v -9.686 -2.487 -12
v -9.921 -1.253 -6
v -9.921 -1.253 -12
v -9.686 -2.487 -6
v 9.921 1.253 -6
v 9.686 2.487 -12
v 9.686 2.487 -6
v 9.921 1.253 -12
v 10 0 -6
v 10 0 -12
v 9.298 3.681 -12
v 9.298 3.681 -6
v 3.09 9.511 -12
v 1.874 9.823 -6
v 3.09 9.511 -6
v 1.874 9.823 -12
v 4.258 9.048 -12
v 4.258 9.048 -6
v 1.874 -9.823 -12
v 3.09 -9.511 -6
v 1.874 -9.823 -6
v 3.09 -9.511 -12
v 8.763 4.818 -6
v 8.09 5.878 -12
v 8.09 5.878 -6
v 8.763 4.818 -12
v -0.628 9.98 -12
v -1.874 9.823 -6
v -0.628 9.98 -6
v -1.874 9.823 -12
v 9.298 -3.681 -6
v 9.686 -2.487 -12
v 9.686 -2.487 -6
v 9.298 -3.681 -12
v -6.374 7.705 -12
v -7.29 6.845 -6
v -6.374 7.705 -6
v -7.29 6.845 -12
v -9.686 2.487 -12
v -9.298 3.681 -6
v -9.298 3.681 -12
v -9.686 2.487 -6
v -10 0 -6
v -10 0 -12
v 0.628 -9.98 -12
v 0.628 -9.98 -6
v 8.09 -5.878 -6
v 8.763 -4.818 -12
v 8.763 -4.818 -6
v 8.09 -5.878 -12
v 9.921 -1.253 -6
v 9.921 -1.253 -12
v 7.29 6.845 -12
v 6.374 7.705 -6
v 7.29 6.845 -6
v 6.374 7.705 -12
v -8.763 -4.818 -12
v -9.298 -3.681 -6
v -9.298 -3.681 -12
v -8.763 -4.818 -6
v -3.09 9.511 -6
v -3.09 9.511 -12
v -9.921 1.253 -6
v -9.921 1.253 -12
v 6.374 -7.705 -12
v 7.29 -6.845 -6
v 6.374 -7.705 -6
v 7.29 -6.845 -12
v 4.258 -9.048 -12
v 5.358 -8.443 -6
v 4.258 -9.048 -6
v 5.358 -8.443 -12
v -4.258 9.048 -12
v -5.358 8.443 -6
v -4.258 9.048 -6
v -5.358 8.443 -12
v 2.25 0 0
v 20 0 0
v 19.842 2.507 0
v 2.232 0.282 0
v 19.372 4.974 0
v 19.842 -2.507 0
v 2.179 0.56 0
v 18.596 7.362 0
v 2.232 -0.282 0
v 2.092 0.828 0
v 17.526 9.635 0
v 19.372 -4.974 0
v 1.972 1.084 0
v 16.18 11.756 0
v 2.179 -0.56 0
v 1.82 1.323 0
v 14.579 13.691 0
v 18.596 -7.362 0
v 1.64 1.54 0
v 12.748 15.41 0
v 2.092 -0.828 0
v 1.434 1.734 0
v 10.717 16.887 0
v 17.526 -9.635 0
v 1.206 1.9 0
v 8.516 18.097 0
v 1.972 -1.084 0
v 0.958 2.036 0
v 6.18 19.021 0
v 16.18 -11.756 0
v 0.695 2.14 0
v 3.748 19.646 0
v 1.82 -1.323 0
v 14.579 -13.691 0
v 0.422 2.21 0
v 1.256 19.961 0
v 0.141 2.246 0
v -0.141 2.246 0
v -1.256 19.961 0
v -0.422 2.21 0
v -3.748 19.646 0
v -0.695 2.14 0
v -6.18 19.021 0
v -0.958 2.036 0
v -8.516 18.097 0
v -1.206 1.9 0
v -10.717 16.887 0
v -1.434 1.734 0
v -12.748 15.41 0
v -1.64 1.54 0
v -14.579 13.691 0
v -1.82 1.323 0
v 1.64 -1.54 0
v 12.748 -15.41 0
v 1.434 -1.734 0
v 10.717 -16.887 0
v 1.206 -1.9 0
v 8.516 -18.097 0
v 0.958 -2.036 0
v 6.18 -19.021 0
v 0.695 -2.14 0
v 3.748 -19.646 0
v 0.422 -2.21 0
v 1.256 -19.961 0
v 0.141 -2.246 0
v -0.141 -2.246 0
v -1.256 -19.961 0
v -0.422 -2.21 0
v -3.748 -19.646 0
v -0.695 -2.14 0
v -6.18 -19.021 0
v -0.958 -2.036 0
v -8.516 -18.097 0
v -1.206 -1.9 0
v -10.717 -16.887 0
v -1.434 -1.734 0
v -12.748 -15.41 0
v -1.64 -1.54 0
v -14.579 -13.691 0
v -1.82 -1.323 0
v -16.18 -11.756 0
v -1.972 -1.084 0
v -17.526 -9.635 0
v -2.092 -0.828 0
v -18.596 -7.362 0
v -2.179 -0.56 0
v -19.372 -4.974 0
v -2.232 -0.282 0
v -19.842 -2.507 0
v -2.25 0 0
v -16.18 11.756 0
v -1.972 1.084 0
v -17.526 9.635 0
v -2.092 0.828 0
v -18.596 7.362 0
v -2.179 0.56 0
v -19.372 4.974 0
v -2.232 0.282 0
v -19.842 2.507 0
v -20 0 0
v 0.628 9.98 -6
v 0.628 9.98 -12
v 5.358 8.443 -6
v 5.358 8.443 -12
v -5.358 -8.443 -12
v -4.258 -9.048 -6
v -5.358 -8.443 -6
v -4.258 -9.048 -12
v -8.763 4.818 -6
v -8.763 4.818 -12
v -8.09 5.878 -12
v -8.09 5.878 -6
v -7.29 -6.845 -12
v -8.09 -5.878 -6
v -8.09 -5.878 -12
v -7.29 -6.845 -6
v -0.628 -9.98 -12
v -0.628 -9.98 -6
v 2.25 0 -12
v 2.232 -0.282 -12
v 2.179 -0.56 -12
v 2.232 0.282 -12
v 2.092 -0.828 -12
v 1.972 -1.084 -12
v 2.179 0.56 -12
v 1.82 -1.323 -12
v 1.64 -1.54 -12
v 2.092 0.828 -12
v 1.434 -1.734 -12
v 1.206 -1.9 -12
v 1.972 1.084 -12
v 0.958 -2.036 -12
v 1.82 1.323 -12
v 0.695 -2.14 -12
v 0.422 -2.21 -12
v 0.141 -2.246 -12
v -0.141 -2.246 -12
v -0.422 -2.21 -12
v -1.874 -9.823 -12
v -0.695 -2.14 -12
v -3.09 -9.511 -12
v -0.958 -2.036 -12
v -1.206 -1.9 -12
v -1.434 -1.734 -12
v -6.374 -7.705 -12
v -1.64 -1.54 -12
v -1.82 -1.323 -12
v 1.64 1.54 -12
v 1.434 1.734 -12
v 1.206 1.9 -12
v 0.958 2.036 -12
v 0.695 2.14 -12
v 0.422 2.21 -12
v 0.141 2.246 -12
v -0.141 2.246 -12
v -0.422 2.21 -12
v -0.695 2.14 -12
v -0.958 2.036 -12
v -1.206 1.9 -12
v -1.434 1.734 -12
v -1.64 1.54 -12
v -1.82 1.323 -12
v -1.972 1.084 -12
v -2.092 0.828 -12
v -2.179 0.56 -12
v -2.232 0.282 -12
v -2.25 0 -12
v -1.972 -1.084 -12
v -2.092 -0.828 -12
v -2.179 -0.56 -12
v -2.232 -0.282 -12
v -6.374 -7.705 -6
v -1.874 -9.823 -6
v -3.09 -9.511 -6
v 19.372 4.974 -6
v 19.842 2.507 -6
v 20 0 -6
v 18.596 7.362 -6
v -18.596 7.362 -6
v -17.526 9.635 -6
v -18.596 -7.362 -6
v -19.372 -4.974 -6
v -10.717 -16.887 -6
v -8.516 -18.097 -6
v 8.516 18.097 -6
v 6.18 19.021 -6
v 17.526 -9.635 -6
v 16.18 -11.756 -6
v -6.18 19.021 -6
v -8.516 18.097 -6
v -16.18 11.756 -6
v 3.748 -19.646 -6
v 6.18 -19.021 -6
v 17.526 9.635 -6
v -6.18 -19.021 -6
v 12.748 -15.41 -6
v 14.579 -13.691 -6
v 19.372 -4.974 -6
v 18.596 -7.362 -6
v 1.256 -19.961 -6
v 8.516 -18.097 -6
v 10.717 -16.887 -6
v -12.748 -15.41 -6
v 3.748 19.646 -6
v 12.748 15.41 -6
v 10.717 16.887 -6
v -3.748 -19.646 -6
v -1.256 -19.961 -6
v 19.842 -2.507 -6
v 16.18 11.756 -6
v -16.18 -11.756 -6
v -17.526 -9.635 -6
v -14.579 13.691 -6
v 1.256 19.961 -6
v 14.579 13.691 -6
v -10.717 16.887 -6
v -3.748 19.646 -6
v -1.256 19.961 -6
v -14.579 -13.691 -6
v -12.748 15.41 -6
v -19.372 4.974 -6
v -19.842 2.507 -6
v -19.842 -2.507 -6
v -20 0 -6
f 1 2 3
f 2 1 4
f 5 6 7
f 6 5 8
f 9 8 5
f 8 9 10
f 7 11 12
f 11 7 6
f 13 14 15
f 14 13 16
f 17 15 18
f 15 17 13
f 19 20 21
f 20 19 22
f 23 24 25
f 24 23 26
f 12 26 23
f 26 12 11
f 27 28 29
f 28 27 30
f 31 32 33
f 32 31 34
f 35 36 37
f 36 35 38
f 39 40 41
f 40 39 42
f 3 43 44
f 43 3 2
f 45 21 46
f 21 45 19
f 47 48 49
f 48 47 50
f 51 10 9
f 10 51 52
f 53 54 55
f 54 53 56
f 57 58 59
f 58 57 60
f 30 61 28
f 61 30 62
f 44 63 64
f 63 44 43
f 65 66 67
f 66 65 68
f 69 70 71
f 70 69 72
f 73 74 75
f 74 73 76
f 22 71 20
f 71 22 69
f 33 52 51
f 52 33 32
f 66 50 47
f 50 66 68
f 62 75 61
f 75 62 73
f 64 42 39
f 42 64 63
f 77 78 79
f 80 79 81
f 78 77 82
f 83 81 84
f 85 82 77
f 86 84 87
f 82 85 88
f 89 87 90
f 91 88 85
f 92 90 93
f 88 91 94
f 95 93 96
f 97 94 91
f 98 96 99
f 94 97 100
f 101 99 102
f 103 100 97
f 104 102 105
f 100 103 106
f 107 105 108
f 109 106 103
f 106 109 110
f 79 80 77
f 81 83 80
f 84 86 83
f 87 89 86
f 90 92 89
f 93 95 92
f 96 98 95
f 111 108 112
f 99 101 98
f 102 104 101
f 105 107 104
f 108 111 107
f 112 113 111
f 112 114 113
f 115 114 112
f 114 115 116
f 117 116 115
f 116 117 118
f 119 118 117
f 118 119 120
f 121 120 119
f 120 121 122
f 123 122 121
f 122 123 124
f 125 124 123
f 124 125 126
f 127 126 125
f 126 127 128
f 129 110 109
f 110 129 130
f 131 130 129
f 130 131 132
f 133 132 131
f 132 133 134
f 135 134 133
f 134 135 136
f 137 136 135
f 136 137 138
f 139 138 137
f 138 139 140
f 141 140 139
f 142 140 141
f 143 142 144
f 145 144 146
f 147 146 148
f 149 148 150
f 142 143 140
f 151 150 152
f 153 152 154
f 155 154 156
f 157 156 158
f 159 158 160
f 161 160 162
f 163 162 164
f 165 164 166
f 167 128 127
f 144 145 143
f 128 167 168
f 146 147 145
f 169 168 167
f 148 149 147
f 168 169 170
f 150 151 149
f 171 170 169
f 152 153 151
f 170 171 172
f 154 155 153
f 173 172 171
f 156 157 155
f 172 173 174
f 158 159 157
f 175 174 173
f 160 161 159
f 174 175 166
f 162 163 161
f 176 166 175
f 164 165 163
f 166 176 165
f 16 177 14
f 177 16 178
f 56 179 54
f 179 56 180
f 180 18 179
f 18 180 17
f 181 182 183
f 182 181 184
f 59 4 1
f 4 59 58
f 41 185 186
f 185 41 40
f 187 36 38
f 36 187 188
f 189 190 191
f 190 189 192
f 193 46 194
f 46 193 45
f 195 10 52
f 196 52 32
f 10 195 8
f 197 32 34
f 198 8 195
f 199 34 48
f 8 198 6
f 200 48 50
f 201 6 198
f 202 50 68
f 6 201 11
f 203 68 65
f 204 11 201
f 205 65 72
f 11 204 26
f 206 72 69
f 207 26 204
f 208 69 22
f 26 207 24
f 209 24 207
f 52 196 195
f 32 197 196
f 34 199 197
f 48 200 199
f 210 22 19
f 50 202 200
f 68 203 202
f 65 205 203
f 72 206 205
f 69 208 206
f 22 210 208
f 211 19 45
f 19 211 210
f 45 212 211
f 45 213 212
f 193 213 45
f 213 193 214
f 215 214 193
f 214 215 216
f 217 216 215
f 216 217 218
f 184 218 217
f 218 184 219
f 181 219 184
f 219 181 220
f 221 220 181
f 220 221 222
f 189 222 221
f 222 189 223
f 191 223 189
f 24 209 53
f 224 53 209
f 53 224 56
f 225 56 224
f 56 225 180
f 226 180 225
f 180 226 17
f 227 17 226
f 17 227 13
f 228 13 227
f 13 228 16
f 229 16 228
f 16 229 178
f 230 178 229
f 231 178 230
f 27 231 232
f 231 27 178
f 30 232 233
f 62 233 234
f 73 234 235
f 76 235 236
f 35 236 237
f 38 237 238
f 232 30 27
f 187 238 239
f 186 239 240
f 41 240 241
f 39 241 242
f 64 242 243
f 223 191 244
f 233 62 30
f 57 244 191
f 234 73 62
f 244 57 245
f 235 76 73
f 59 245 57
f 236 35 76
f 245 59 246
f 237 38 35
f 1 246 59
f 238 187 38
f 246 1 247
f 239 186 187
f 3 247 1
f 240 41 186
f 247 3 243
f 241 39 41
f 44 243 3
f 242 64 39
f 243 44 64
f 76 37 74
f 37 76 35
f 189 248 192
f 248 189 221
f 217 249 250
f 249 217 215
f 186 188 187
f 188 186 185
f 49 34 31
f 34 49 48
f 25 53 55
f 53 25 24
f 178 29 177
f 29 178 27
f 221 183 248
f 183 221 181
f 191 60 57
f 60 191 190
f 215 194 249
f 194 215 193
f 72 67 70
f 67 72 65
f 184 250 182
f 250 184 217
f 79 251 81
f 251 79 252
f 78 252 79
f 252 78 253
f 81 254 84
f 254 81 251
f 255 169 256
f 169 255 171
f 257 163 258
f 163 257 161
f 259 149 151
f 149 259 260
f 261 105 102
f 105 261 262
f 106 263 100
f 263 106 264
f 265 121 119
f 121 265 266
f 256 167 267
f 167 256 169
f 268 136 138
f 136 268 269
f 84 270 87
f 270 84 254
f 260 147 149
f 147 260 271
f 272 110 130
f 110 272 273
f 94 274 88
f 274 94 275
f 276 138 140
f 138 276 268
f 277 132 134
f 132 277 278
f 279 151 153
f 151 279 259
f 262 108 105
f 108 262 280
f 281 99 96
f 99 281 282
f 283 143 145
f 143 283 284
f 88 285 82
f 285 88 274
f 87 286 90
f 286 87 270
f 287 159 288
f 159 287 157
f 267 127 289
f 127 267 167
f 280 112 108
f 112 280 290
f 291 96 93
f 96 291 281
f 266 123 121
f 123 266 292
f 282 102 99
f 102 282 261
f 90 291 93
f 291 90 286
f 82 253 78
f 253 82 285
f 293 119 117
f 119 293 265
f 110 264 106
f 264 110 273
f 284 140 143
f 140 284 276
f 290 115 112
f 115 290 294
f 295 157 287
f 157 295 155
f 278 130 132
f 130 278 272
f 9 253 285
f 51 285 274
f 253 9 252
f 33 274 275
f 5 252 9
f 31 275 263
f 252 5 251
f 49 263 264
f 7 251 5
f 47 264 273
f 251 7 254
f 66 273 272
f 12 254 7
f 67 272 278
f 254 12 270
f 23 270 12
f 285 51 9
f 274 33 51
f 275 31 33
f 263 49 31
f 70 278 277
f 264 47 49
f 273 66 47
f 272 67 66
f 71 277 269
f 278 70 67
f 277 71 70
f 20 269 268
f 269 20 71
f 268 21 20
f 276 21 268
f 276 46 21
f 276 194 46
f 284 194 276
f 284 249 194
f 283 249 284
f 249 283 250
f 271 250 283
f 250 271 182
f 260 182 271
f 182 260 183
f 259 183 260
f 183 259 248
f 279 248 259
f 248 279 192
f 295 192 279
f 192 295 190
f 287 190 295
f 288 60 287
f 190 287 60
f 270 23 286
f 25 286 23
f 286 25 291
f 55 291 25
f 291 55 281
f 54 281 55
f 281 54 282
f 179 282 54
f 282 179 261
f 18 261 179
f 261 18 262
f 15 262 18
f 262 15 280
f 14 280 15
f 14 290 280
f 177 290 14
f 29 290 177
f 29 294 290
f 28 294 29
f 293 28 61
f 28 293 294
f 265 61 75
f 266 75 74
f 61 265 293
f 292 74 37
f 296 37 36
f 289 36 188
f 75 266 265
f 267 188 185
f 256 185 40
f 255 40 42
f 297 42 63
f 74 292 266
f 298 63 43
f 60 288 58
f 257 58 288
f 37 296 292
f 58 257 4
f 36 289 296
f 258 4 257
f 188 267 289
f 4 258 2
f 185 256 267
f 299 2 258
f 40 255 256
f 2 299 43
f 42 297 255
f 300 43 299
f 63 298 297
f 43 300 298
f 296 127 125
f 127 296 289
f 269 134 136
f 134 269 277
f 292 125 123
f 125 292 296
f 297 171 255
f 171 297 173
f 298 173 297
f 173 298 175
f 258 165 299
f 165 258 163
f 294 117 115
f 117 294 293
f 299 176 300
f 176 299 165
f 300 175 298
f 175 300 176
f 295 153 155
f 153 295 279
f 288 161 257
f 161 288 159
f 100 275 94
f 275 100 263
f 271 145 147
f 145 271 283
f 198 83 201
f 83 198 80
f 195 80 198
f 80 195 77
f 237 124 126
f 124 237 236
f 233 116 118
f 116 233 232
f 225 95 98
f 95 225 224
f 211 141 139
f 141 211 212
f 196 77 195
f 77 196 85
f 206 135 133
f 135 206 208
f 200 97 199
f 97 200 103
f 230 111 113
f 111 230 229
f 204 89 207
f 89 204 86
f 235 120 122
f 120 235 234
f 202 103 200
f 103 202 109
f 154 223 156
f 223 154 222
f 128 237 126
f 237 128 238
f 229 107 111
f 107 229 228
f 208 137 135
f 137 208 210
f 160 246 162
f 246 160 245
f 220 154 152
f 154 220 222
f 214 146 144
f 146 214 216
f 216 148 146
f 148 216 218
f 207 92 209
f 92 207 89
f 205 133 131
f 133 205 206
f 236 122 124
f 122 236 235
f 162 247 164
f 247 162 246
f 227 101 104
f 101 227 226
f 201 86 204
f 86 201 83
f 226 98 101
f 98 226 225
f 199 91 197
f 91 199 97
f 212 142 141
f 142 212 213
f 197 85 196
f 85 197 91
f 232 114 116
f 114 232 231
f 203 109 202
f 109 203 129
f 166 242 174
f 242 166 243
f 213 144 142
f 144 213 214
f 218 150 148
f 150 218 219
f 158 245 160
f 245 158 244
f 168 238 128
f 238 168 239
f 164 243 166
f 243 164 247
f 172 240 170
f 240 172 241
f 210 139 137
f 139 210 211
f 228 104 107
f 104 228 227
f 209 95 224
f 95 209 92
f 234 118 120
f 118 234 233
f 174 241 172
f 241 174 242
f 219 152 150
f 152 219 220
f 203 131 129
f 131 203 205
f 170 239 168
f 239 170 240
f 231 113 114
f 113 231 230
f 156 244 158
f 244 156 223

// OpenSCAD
$fn = 50;


difference() {
	union() {
		translate(v = [0, 0, -12.0000000000]) {
			cylinder(h = 12, r = 10.0000000000);
		}
		translate(v = [0, 0, -6.0000000000]) {
			cylinder(h = 6, r = 20.0000000000);
		}
	}
	union() {
		#translate(v = [0, 0, -12]) {
			cylinder(h = 12, r = 2.2500000000);
		}
	}
}
